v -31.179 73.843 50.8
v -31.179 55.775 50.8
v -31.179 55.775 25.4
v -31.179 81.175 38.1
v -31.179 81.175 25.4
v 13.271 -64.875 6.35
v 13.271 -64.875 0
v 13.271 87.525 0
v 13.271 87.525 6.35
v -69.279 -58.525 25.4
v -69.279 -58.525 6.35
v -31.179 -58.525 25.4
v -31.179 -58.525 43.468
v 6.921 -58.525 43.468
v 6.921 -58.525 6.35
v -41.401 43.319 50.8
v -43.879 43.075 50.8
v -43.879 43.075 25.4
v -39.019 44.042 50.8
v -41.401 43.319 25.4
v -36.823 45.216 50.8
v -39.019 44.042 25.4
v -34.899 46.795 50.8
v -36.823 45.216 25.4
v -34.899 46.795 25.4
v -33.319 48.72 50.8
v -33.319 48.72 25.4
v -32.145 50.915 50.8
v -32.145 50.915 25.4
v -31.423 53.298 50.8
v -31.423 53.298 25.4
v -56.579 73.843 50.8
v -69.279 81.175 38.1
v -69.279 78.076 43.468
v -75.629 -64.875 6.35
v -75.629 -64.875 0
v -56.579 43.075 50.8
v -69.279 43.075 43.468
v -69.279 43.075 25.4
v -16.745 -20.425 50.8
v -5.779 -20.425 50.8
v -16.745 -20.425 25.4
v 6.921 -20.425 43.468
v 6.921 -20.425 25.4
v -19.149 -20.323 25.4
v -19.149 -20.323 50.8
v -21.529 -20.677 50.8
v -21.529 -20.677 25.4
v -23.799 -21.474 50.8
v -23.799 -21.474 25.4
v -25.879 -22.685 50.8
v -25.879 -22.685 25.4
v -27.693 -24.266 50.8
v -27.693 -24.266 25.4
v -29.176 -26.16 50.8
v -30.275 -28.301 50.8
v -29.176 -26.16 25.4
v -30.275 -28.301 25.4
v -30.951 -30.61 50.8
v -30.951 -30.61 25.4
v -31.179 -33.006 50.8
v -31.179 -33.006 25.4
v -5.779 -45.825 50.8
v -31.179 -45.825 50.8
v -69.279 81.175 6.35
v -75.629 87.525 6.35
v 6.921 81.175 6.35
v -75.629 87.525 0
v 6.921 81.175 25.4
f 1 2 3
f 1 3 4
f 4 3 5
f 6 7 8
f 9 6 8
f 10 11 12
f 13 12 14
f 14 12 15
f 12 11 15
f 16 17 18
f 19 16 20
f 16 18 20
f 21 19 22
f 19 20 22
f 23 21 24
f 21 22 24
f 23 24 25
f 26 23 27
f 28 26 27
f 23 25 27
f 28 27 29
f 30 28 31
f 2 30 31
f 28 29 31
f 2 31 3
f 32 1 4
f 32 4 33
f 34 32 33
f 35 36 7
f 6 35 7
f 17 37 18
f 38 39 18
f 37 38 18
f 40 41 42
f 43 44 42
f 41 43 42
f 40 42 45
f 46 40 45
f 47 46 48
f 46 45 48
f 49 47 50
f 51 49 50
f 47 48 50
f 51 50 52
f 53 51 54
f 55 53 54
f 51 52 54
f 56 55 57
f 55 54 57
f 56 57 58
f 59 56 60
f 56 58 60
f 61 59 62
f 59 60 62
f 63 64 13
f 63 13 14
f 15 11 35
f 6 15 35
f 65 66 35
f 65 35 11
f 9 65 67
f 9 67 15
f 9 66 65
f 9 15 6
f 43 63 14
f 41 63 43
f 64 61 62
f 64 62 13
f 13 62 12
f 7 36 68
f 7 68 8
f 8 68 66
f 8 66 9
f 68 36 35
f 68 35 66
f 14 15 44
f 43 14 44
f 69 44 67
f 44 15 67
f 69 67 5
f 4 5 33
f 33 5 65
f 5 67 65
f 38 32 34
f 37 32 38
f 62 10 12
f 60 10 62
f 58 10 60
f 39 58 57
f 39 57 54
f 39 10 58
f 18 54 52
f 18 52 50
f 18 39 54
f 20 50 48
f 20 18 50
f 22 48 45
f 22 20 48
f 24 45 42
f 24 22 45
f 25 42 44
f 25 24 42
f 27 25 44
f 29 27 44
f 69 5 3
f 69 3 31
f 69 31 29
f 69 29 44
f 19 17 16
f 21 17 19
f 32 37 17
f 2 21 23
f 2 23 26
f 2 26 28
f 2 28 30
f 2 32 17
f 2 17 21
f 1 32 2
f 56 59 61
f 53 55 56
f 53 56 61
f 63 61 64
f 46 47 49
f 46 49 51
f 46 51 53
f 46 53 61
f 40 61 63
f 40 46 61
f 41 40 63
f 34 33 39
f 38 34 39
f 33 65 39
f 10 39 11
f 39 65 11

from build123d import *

# Parameters (mm, degrees)
F0_W        = 88.9
F0_H        = 152.4
F1_DEPTH    = 6.35
F2_DEPTH    = 25.4
F3_DEPTH    = 50.8
F4_C1_SIZE2 = 12.7
F4_C1_SIZE  = 7.3323484187
F4_C2_SIZE2 = 12.7
F4_C2_SIZE  = 7.3323484187
F4_C3_SIZE2 = 7.3323484187
F4_C3_SIZE  = 12.7
F4_C4_SIZE2 = 12.7
F4_C4_SIZE  = 7.3323484187


with BuildPart() as f1:
    # F0 (on Top) → F1 (new body)
    with BuildSketch(Plane.XY):
        with Locations((-31.1787627001, 11.3253805135)):
            Rectangle(F0_W, F0_H)
        Polygon((-69.2787627001, 43.0753805135), (-69.2787627001, 81.1753805135), (-31.1787627001, 81.1753805135), (6.9212372999, 81.1753805135), (6.9212372999, -20.4246194865), (6.9212372999, -58.5246194865), (-31.1787627001, -58.5246194865), (-69.2787627001, -58.5246194865), align=None, mode=Mode.SUBTRACT)
    extrude(amount=F1_DEPTH)

    # F0 (on Top) → F2 (join)
    with BuildSketch(Plane.XY):
        with BuildLine():
            Line((6.9212372999, 81.1753805135), (-31.1787627001, 81.1753805135))
            Line((-31.1787627001, 81.1753805135), (-31.1787627001, 55.7753805135))
            ThreePointArc((-31.1787627001, 55.7753805135), (-34.898506579, 46.7951243925), (-43.8787627001, 43.0753805135))
            Line((-43.8787627001, 43.0753805135), (-69.2787627001, 43.0753805135))
            Line((-69.2787627001, 43.0753805135), (-69.2787627001, -58.5246194865))
            Line((-69.2787627001, -58.5246194865), (-31.1787627001, -58.5246194865))
            Line((-31.1787627001, -58.5246194865), (-31.1787627001, -33.0056861837))
            ThreePointArc((-31.1787627001, -33.0056861837), (-26.8234670857, -23.4319769383), (-16.7447613275, -20.4246194865))
            Line((-16.7447613275, -20.4246194865), (6.9212372999, -20.4246194865))
            Line((6.9212372999, -20.4246194865), (6.9212372999, 81.1753805135))
        make_face()
    extrude(amount=F2_DEPTH)

    # F0 (on Top) → F3 (join)
    with BuildSketch(Plane.XY):
        with BuildLine():
            Line((-31.1787627001, 81.1753805135), (-69.2787627001, 81.1753805135))
            Line((-69.2787627001, 81.1753805135), (-69.2787627001, 43.0753805135))
            Line((-69.2787627001, 43.0753805135), (-43.8787627001, 43.0753805135))
            ThreePointArc((-43.8787627001, 43.0753805135), (-34.898506579, 46.7951243925), (-31.1787627001, 55.7753805135))
            Line((-31.1787627001, 55.7753805135), (-31.1787627001, 81.1753805135))
        make_face()
        with BuildLine():
            Line((6.9212372999, -58.5246194865), (6.9212372999, -20.4246194865))
            Line((6.9212372999, -20.4246194865), (-16.7447613275, -20.4246194865))
            ThreePointArc((-16.7447613275, -20.4246194865), (-26.8234670857, -23.4319769383), (-31.1787627001, -33.0056861837))
            Line((-31.1787627001, -33.0056861837), (-31.1787627001, -58.5246194865))
            Line((-31.1787627001, -58.5246194865), (6.9212372999, -58.5246194865))
        make_face()
    extrude(amount=F3_DEPTH)

    # F4: chamfer of 12.7 x 7.3323484187 on 4 edges, made by hand

    # F4_c1
    f4_c1_edges = [f1.edges().sort_by_distance(p)[0] for p in [
        (-12.1287627001, -58.5246194865, 50.8),
    ]]
    f4_c1_side = f1.faces().sort_by_distance((-12.1287627001, -58.5246194865, 50.6533530316))[0]
    chamfer(f4_c1_edges, length=F4_C1_SIZE, length2=F4_C1_SIZE2, reference=f4_c1_side)

    # F4_c2
    f4_c2_edges = [f1.edges().sort_by_distance(p)[0] for p in [
        (6.9212372999, -33.1246194865, 50.8),
    ]]
    f4_c2_side = f1.faces().sort_by_distance((6.9212372999, -33.1246194865, 50.6533530316))[0]
    chamfer(f4_c2_edges, length=F4_C2_SIZE, length2=F4_C2_SIZE2, reference=f4_c2_side)

    # F4_c3
    f4_c3_edges = [f1.edges().sort_by_distance(p)[0] for p in [
        (-50.2287627001, 81.1753805135, 50.8),
    ]]
    f4_c3_side = f1.faces().sort_by_distance((-50.2287627001, 81.1753805135, 50.6533530316))[0]
    chamfer(f4_c3_edges, length=F4_C3_SIZE, length2=F4_C3_SIZE2, reference=f4_c3_side)

    # F4_c4
    f4_c4_edges = [f1.edges().sort_by_distance(p)[0] for p in [
        (-69.2787627001, 58.4592063042, 50.8),
    ]]
    f4_c4_side = f1.faces().sort_by_distance((-69.2787627001, 58.4592063042, 50.6533530316))[0]
    chamfer(f4_c4_edges, length=F4_C4_SIZE, length2=F4_C4_SIZE2, reference=f4_c4_side)


solid = f1.part
